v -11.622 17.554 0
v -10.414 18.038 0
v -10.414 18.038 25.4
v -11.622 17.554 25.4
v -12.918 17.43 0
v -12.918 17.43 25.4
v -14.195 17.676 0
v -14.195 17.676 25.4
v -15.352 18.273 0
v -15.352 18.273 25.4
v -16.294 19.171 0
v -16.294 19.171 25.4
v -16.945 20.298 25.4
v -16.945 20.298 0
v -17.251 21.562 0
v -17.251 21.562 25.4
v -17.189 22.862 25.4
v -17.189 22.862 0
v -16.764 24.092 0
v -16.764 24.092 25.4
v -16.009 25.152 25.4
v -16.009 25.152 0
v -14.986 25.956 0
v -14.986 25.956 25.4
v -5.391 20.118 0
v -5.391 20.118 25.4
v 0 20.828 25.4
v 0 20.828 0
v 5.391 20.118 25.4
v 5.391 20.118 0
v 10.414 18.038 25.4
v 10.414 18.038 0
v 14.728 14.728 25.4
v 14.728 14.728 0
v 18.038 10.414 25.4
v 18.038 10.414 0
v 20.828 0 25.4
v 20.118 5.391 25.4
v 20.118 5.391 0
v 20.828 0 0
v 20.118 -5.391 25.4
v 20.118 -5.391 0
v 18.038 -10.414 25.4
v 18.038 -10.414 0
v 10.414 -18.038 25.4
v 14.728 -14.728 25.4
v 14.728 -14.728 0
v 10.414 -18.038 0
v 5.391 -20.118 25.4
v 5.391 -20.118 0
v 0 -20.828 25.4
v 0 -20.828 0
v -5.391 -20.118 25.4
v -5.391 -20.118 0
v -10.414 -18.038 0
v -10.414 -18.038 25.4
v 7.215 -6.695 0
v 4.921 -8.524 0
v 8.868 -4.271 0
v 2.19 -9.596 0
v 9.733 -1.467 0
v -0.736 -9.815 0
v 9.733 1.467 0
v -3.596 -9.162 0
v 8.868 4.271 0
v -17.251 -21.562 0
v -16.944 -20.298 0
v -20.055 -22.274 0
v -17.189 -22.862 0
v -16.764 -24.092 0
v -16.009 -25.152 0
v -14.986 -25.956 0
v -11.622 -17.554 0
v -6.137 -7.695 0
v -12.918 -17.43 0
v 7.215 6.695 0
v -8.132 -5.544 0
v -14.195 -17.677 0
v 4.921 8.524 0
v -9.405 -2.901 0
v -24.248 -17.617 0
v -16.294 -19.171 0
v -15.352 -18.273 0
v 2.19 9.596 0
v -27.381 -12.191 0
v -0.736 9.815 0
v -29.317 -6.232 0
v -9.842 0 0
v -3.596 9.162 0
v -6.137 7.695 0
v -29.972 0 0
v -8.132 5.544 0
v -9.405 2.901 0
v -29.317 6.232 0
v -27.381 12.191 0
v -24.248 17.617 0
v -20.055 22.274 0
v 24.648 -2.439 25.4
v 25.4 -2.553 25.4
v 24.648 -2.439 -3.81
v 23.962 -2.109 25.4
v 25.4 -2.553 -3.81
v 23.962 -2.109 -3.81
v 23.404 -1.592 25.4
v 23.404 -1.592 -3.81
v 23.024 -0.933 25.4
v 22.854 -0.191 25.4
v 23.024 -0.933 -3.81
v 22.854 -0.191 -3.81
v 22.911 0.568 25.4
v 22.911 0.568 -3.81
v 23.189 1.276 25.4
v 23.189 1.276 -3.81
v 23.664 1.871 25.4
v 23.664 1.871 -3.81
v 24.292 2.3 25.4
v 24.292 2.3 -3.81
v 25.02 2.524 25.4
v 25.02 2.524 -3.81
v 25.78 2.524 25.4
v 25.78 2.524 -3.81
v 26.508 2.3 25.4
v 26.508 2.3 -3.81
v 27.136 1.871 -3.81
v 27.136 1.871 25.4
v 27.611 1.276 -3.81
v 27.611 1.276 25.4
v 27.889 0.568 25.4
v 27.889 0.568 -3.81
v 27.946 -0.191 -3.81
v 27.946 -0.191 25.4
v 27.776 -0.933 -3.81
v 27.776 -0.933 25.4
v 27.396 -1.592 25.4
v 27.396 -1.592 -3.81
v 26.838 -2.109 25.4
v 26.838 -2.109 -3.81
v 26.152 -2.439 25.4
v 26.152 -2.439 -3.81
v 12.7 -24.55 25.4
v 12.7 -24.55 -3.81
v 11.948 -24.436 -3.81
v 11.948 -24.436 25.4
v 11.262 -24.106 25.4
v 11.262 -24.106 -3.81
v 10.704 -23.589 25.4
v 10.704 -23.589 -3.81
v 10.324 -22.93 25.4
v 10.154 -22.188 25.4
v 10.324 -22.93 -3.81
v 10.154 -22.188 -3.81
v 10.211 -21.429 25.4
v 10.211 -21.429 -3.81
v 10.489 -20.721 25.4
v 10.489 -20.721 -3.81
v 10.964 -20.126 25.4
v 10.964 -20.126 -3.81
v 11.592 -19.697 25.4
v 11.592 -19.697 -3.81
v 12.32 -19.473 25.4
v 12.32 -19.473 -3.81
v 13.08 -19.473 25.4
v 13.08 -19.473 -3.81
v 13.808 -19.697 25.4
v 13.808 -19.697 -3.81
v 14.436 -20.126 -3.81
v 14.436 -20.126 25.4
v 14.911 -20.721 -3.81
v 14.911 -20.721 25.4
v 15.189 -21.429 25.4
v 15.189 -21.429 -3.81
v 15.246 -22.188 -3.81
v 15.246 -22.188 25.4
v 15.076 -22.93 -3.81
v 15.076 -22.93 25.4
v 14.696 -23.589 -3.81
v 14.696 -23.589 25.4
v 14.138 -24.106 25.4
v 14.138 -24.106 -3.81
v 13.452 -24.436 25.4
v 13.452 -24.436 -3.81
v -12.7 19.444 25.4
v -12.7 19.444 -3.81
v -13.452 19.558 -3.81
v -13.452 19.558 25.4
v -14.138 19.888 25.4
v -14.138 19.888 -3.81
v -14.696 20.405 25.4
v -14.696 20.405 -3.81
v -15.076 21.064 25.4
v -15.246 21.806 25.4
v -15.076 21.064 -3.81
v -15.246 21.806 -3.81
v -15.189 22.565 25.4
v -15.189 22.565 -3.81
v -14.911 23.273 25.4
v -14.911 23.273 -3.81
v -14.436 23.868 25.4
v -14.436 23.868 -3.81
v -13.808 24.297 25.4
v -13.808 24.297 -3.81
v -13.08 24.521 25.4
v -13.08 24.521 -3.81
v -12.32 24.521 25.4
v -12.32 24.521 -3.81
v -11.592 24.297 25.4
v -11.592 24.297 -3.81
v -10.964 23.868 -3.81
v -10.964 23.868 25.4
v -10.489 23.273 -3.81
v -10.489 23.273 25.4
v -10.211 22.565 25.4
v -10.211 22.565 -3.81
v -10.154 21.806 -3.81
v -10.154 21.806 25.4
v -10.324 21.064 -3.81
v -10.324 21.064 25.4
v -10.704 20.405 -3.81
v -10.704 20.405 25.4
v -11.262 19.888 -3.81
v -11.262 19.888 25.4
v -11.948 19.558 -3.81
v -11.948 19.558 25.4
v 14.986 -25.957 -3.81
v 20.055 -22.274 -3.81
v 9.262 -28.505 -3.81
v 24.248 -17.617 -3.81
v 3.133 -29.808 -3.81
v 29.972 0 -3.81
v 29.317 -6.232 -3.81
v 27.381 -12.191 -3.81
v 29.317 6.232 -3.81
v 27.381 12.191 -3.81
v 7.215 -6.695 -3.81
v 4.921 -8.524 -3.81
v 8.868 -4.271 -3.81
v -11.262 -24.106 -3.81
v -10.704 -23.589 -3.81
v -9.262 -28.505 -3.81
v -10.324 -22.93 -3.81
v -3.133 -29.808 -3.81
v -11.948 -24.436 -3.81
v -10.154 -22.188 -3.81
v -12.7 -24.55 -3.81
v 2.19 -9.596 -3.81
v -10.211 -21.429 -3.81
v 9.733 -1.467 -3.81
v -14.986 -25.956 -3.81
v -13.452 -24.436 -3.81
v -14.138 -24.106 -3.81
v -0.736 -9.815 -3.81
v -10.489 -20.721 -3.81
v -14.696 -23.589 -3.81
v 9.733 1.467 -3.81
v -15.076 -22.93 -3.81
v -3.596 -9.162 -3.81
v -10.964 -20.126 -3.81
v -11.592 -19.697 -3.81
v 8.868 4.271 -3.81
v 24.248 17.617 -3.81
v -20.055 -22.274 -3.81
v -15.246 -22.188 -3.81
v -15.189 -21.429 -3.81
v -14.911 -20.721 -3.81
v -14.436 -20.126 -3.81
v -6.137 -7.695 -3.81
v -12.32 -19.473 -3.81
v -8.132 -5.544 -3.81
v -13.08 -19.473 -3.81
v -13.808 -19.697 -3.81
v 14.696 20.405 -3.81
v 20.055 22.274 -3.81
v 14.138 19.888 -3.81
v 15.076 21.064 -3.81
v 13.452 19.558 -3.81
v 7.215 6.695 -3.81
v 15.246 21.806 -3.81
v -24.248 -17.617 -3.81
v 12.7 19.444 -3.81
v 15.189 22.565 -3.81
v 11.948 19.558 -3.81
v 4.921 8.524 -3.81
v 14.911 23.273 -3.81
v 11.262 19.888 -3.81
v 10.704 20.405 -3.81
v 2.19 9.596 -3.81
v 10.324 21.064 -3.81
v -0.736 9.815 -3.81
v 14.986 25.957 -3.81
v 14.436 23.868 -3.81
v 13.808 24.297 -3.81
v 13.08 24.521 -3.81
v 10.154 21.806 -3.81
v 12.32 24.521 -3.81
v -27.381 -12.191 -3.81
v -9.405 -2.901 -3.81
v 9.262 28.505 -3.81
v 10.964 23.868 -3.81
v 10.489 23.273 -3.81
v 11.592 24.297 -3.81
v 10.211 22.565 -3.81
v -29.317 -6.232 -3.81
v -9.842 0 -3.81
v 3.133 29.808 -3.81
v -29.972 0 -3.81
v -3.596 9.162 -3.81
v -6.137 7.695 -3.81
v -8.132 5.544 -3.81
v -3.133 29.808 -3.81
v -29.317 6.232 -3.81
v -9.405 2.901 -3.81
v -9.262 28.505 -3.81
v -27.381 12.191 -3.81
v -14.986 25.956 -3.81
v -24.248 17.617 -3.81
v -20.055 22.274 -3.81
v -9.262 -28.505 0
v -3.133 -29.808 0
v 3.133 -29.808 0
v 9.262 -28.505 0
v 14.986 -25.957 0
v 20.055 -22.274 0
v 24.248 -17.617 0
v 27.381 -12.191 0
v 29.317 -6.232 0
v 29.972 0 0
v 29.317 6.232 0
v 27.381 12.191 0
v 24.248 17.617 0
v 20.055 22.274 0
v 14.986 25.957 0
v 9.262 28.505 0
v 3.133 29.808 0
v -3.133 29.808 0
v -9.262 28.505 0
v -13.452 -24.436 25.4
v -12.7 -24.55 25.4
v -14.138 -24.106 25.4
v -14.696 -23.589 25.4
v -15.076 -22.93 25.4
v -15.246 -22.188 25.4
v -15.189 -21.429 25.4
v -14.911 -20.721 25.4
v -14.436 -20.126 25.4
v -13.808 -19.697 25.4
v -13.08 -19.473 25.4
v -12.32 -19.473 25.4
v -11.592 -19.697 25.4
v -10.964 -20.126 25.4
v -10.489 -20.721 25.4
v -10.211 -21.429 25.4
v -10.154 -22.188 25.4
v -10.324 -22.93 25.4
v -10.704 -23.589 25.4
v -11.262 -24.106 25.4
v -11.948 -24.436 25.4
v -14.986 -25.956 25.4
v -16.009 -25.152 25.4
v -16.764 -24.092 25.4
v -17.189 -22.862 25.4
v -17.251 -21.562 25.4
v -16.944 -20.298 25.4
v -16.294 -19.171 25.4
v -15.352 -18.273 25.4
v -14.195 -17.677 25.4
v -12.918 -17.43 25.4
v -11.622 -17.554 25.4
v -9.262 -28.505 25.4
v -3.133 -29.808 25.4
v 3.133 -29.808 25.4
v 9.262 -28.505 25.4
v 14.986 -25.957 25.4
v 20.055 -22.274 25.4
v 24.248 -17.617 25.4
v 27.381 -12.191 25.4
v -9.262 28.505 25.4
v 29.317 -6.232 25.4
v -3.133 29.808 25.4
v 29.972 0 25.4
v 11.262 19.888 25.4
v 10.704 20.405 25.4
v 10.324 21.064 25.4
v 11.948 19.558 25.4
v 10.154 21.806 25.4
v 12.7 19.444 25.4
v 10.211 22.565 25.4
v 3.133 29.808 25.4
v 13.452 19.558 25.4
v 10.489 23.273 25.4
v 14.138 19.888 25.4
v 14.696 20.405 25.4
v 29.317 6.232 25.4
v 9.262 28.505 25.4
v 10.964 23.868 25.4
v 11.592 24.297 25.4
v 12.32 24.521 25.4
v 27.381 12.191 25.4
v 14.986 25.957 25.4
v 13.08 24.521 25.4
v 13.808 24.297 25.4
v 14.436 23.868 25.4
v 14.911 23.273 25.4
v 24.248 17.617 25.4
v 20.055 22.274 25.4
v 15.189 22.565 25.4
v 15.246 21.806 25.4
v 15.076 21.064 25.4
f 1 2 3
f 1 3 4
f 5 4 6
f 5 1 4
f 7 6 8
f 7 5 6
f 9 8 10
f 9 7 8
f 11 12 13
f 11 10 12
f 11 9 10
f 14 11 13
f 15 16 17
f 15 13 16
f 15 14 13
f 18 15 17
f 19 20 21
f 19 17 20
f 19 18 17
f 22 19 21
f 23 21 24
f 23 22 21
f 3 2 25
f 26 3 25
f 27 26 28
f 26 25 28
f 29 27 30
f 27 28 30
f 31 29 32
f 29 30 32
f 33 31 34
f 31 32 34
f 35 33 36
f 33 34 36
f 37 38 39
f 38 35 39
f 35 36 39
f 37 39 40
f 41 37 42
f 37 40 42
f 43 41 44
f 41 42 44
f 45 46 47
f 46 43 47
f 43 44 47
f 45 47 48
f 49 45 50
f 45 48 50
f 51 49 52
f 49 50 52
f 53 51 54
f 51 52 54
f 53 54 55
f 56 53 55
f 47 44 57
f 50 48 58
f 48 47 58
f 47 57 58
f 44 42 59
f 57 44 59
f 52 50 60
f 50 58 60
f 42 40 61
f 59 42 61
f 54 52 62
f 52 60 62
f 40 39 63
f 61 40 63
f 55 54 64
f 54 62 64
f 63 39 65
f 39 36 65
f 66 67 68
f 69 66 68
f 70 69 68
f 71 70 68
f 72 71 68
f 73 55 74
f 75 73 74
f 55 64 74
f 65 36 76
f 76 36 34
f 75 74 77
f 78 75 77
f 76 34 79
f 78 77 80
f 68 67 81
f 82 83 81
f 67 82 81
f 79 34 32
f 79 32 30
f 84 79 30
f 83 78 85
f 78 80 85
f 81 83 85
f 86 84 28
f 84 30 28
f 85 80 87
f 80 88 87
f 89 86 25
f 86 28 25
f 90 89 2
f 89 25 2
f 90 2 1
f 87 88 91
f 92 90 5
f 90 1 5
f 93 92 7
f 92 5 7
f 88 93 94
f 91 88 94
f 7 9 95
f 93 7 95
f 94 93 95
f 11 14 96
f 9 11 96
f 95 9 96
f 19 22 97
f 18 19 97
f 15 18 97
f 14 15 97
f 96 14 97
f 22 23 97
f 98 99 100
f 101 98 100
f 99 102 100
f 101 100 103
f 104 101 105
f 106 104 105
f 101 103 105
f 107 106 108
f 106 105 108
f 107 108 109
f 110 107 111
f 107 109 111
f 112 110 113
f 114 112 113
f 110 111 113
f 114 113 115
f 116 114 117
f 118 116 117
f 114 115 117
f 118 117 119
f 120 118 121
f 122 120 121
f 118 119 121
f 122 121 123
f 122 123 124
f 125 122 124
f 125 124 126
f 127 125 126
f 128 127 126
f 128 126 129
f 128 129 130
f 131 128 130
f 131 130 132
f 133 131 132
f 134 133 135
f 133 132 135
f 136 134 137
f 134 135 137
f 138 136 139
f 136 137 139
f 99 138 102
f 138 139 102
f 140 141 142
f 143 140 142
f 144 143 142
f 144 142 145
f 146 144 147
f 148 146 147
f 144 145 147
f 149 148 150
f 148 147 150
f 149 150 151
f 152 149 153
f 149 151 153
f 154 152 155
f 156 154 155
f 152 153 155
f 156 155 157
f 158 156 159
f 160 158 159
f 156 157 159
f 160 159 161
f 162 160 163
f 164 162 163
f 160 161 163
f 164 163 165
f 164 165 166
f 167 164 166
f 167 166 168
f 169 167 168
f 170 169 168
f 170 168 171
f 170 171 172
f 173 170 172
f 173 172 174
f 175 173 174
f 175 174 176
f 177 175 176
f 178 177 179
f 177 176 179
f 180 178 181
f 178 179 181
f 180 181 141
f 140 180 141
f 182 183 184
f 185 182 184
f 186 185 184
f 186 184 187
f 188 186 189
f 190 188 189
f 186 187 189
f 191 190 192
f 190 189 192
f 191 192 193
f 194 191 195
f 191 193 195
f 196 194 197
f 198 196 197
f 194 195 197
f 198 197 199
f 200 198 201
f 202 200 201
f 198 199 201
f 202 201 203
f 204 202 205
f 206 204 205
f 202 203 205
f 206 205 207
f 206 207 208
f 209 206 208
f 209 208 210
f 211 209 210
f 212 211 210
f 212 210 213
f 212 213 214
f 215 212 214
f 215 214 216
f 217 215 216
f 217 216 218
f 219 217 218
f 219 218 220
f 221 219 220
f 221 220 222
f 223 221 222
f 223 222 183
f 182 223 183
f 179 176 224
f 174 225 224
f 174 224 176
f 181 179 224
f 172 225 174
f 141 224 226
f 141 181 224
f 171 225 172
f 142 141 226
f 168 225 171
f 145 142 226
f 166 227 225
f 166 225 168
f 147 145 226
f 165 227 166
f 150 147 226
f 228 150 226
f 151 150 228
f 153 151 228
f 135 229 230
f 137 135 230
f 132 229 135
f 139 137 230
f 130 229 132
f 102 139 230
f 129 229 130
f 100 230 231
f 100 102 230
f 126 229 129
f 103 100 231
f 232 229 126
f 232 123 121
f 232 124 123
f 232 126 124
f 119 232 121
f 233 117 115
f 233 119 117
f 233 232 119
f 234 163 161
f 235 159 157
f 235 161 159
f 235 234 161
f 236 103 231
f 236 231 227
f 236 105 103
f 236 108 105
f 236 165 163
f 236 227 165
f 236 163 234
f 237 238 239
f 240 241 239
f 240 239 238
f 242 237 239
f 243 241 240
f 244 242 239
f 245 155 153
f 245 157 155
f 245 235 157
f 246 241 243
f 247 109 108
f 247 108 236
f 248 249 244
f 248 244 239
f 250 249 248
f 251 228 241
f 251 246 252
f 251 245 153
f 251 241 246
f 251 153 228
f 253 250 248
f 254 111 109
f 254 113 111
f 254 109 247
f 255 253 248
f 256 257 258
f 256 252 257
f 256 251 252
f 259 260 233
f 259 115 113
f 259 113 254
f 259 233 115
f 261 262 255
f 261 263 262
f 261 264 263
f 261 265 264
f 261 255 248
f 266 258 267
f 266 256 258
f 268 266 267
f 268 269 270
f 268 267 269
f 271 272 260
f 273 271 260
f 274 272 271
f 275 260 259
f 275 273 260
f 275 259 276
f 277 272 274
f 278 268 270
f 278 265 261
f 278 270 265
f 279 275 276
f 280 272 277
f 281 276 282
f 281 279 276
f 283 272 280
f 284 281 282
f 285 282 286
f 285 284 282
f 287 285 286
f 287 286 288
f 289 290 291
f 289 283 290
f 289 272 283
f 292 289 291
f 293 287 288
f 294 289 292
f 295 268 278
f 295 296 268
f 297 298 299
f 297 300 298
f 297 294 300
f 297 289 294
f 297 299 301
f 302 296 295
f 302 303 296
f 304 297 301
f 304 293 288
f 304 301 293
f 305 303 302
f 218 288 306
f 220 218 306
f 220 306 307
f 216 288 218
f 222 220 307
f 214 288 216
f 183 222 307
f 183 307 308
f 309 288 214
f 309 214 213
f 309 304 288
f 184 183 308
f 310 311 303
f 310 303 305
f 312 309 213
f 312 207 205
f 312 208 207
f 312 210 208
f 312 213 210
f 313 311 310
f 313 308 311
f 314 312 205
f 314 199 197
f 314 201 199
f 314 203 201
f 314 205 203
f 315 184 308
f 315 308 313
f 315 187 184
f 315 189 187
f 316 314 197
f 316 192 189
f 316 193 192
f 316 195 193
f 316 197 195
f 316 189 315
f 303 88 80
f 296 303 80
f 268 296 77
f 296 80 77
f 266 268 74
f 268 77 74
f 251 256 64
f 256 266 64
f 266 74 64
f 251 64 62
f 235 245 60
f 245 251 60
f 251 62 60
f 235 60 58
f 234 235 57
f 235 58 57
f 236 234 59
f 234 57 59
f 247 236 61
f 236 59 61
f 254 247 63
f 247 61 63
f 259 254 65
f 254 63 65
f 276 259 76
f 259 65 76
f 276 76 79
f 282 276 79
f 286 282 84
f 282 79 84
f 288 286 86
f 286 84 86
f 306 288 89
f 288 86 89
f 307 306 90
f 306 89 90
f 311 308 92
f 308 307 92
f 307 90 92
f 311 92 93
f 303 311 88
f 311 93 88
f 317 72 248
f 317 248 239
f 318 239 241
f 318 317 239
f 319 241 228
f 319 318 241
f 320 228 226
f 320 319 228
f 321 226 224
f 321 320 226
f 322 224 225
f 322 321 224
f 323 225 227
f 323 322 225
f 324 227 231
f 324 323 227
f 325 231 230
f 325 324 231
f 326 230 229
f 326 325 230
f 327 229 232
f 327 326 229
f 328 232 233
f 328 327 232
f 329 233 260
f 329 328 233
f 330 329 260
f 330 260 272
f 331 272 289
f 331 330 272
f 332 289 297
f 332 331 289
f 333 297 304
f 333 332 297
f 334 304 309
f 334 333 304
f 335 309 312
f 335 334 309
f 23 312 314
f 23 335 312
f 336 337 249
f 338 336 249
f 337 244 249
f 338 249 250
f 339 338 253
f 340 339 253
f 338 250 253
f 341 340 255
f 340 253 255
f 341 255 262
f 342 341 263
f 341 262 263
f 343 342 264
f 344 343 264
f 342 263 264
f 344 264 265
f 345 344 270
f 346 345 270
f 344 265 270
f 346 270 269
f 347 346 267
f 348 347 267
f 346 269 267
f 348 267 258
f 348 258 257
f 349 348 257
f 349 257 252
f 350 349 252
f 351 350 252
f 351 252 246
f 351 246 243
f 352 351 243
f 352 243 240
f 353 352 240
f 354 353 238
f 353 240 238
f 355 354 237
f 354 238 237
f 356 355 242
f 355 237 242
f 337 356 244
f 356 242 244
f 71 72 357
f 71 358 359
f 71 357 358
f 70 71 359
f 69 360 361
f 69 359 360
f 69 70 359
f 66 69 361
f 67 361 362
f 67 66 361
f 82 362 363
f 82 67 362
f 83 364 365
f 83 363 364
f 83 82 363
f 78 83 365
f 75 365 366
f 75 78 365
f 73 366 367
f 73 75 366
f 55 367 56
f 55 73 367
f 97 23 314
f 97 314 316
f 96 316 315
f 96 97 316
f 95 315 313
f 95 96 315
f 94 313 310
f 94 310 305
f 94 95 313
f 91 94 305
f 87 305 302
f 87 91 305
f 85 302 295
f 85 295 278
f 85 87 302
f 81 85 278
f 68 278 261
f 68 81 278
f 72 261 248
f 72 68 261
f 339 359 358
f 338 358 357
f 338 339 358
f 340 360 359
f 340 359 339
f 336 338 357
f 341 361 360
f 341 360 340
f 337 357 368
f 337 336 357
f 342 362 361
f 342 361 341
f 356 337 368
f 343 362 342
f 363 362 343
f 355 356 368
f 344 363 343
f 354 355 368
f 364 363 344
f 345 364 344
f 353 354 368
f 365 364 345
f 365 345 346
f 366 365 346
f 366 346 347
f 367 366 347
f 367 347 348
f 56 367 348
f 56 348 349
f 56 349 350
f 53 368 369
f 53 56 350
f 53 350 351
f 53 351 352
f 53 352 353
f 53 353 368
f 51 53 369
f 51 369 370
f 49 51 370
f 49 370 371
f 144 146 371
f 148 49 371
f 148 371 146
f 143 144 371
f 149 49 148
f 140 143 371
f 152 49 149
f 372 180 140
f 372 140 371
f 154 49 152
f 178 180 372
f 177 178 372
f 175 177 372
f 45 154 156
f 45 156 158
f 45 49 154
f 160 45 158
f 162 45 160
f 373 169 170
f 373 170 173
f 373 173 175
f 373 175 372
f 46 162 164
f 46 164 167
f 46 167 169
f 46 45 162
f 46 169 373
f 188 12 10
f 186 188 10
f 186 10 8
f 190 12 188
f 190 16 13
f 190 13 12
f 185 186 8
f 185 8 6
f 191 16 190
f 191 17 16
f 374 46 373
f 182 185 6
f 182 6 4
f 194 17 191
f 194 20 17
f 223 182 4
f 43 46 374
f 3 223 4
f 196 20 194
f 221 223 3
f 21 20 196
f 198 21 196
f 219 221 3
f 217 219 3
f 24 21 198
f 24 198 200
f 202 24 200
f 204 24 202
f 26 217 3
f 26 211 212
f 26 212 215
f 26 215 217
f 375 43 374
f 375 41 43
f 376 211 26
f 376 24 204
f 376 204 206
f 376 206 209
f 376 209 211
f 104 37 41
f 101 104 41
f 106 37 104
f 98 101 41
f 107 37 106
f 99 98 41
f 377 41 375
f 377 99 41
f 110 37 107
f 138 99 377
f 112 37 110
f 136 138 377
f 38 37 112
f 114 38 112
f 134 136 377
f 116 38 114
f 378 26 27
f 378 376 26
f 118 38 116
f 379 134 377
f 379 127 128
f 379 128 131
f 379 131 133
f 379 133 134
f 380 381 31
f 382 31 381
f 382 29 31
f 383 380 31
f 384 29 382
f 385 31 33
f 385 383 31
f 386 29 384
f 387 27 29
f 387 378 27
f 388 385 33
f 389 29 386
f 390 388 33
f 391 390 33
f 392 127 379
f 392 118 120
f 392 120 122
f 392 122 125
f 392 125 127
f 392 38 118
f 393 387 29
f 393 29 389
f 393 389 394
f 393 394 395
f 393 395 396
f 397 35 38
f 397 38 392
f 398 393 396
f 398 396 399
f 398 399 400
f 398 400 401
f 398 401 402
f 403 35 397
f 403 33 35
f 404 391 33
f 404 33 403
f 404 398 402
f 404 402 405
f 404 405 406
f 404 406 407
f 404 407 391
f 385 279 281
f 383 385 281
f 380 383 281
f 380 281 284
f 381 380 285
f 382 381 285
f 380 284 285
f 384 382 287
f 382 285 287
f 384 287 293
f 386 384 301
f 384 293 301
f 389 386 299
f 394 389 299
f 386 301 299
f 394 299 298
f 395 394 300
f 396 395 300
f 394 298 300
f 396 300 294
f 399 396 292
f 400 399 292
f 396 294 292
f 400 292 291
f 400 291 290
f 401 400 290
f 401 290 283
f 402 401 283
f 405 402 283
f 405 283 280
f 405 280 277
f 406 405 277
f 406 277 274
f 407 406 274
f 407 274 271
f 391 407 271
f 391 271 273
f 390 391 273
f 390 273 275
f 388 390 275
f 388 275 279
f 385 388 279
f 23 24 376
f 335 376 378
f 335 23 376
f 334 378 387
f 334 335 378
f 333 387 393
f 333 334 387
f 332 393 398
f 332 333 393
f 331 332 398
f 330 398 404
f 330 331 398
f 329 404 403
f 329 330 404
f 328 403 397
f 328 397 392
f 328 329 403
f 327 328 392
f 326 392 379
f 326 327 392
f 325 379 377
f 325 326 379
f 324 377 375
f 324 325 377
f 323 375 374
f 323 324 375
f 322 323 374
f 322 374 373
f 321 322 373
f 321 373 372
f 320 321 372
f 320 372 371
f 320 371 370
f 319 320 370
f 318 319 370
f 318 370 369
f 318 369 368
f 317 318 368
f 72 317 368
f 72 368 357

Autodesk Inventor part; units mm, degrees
ref_plane "YZ Plane" through (0, 0, 0) normal (1, 0, 0) x (0, 1, 0)
ref_plane "XZ Plane" through (0, 0, 0) normal (0, 1, 0) x (-1, 0, 0)
ref_plane "XY Plane" through (0, 0, 0) normal (0, 0, 1) x (1, 0, 0)
sketch "Sketch1" plane through (0, 0, 0) normal (0, 0, 1) x (1, 0, 0)
  circle A0 centre (0, 0) radius 29.972
  circle A1 centre (0, 0) radius 25.4 construction
  circle A2 centre (12.7, 21.997) radius 2.5527 construction
  circle A3 centre (-12.7, 21.997) radius 2.5527 construction
  circle A4 centre (-25.4, 0) radius 2.5527 construction
  circle A5 centre (-12.7, -21.997) radius 2.5527 construction
  circle A6 centre (12.7, -21.997) radius 2.5527 construction
  circle A7 centre (25.4, 0) radius 2.5527 construction
  line L0 (-12.7, 21.997) -> (12.7, 21.997) construction
  arc A8 (-14.986, 25.9565) -> (-10.414, 18.0376) centre (-12.7, 21.997) ccw
  arc A9 (-10.414, -18.0376) -> (-10.414, 18.0376) centre (0, 0) ccw
  arc A10 (-10.414, -18.0376) -> (-14.986, -25.9565) centre (-12.7, -21.997) ccw
  dimension "d1" = 50.8
  dimension "d0" = 59.944
  dimension "d2" = 5.1054
  dimension "d5" = 360
extrude "Extrusion1" add sketch "Sketch1" along normal blind 25.4 contours A0 A10 A9 A8 picked at (-11.332, -24.2357)
sketch "Sketch2" plane through (0, 0, 0) normal (0, 0, -1) x (-1, 0, 0)
  circle A0 centre (0, 0) radius 29.972
  circle A1 centre (0, 0) radius 9.8425
  arc A2 (14.986, 25.9565) -> (14.986, -25.9565) centre (0, 0) ccw projected
  dimension "d13" = 19.685
  dimension "d14" = 59.944
extrude "Extrusion2" add sketch "Sketch2" along normal blind 3.81
sketch "Sketch3" plane through (0, 0, 25.4) normal (0, 0, 1) x (1, 0, 0)
  circle A0 centre (0, 0) radius 9.8425 projected
  circle A1 centre (0, 0) radius 25.4
  arc A2 (-14.986, 25.9565) -> (-10.414, 18.0376) centre (-12.7, 21.997) ccw projected
  point P0 (-25.4, 0)
  point P1 (-12.7, -21.997)
  point P2 (12.7, -21.997)
  point P3 (25.4, 0)
  point P4 (12.7, 21.997)
  dimension "d19" = 360
hole "Hole1" at (-12.7, 21.997, 25.4) at (12.7, 21.997, 25.4) at (25.4, 0, 25.4) at (12.7, -21.997, 25.4) at (-12.7, -21.997, 25.4) direction (0, 0, -1) diameter 5.1054 end through all
properties part number "Motor_spacer_Falcon"
